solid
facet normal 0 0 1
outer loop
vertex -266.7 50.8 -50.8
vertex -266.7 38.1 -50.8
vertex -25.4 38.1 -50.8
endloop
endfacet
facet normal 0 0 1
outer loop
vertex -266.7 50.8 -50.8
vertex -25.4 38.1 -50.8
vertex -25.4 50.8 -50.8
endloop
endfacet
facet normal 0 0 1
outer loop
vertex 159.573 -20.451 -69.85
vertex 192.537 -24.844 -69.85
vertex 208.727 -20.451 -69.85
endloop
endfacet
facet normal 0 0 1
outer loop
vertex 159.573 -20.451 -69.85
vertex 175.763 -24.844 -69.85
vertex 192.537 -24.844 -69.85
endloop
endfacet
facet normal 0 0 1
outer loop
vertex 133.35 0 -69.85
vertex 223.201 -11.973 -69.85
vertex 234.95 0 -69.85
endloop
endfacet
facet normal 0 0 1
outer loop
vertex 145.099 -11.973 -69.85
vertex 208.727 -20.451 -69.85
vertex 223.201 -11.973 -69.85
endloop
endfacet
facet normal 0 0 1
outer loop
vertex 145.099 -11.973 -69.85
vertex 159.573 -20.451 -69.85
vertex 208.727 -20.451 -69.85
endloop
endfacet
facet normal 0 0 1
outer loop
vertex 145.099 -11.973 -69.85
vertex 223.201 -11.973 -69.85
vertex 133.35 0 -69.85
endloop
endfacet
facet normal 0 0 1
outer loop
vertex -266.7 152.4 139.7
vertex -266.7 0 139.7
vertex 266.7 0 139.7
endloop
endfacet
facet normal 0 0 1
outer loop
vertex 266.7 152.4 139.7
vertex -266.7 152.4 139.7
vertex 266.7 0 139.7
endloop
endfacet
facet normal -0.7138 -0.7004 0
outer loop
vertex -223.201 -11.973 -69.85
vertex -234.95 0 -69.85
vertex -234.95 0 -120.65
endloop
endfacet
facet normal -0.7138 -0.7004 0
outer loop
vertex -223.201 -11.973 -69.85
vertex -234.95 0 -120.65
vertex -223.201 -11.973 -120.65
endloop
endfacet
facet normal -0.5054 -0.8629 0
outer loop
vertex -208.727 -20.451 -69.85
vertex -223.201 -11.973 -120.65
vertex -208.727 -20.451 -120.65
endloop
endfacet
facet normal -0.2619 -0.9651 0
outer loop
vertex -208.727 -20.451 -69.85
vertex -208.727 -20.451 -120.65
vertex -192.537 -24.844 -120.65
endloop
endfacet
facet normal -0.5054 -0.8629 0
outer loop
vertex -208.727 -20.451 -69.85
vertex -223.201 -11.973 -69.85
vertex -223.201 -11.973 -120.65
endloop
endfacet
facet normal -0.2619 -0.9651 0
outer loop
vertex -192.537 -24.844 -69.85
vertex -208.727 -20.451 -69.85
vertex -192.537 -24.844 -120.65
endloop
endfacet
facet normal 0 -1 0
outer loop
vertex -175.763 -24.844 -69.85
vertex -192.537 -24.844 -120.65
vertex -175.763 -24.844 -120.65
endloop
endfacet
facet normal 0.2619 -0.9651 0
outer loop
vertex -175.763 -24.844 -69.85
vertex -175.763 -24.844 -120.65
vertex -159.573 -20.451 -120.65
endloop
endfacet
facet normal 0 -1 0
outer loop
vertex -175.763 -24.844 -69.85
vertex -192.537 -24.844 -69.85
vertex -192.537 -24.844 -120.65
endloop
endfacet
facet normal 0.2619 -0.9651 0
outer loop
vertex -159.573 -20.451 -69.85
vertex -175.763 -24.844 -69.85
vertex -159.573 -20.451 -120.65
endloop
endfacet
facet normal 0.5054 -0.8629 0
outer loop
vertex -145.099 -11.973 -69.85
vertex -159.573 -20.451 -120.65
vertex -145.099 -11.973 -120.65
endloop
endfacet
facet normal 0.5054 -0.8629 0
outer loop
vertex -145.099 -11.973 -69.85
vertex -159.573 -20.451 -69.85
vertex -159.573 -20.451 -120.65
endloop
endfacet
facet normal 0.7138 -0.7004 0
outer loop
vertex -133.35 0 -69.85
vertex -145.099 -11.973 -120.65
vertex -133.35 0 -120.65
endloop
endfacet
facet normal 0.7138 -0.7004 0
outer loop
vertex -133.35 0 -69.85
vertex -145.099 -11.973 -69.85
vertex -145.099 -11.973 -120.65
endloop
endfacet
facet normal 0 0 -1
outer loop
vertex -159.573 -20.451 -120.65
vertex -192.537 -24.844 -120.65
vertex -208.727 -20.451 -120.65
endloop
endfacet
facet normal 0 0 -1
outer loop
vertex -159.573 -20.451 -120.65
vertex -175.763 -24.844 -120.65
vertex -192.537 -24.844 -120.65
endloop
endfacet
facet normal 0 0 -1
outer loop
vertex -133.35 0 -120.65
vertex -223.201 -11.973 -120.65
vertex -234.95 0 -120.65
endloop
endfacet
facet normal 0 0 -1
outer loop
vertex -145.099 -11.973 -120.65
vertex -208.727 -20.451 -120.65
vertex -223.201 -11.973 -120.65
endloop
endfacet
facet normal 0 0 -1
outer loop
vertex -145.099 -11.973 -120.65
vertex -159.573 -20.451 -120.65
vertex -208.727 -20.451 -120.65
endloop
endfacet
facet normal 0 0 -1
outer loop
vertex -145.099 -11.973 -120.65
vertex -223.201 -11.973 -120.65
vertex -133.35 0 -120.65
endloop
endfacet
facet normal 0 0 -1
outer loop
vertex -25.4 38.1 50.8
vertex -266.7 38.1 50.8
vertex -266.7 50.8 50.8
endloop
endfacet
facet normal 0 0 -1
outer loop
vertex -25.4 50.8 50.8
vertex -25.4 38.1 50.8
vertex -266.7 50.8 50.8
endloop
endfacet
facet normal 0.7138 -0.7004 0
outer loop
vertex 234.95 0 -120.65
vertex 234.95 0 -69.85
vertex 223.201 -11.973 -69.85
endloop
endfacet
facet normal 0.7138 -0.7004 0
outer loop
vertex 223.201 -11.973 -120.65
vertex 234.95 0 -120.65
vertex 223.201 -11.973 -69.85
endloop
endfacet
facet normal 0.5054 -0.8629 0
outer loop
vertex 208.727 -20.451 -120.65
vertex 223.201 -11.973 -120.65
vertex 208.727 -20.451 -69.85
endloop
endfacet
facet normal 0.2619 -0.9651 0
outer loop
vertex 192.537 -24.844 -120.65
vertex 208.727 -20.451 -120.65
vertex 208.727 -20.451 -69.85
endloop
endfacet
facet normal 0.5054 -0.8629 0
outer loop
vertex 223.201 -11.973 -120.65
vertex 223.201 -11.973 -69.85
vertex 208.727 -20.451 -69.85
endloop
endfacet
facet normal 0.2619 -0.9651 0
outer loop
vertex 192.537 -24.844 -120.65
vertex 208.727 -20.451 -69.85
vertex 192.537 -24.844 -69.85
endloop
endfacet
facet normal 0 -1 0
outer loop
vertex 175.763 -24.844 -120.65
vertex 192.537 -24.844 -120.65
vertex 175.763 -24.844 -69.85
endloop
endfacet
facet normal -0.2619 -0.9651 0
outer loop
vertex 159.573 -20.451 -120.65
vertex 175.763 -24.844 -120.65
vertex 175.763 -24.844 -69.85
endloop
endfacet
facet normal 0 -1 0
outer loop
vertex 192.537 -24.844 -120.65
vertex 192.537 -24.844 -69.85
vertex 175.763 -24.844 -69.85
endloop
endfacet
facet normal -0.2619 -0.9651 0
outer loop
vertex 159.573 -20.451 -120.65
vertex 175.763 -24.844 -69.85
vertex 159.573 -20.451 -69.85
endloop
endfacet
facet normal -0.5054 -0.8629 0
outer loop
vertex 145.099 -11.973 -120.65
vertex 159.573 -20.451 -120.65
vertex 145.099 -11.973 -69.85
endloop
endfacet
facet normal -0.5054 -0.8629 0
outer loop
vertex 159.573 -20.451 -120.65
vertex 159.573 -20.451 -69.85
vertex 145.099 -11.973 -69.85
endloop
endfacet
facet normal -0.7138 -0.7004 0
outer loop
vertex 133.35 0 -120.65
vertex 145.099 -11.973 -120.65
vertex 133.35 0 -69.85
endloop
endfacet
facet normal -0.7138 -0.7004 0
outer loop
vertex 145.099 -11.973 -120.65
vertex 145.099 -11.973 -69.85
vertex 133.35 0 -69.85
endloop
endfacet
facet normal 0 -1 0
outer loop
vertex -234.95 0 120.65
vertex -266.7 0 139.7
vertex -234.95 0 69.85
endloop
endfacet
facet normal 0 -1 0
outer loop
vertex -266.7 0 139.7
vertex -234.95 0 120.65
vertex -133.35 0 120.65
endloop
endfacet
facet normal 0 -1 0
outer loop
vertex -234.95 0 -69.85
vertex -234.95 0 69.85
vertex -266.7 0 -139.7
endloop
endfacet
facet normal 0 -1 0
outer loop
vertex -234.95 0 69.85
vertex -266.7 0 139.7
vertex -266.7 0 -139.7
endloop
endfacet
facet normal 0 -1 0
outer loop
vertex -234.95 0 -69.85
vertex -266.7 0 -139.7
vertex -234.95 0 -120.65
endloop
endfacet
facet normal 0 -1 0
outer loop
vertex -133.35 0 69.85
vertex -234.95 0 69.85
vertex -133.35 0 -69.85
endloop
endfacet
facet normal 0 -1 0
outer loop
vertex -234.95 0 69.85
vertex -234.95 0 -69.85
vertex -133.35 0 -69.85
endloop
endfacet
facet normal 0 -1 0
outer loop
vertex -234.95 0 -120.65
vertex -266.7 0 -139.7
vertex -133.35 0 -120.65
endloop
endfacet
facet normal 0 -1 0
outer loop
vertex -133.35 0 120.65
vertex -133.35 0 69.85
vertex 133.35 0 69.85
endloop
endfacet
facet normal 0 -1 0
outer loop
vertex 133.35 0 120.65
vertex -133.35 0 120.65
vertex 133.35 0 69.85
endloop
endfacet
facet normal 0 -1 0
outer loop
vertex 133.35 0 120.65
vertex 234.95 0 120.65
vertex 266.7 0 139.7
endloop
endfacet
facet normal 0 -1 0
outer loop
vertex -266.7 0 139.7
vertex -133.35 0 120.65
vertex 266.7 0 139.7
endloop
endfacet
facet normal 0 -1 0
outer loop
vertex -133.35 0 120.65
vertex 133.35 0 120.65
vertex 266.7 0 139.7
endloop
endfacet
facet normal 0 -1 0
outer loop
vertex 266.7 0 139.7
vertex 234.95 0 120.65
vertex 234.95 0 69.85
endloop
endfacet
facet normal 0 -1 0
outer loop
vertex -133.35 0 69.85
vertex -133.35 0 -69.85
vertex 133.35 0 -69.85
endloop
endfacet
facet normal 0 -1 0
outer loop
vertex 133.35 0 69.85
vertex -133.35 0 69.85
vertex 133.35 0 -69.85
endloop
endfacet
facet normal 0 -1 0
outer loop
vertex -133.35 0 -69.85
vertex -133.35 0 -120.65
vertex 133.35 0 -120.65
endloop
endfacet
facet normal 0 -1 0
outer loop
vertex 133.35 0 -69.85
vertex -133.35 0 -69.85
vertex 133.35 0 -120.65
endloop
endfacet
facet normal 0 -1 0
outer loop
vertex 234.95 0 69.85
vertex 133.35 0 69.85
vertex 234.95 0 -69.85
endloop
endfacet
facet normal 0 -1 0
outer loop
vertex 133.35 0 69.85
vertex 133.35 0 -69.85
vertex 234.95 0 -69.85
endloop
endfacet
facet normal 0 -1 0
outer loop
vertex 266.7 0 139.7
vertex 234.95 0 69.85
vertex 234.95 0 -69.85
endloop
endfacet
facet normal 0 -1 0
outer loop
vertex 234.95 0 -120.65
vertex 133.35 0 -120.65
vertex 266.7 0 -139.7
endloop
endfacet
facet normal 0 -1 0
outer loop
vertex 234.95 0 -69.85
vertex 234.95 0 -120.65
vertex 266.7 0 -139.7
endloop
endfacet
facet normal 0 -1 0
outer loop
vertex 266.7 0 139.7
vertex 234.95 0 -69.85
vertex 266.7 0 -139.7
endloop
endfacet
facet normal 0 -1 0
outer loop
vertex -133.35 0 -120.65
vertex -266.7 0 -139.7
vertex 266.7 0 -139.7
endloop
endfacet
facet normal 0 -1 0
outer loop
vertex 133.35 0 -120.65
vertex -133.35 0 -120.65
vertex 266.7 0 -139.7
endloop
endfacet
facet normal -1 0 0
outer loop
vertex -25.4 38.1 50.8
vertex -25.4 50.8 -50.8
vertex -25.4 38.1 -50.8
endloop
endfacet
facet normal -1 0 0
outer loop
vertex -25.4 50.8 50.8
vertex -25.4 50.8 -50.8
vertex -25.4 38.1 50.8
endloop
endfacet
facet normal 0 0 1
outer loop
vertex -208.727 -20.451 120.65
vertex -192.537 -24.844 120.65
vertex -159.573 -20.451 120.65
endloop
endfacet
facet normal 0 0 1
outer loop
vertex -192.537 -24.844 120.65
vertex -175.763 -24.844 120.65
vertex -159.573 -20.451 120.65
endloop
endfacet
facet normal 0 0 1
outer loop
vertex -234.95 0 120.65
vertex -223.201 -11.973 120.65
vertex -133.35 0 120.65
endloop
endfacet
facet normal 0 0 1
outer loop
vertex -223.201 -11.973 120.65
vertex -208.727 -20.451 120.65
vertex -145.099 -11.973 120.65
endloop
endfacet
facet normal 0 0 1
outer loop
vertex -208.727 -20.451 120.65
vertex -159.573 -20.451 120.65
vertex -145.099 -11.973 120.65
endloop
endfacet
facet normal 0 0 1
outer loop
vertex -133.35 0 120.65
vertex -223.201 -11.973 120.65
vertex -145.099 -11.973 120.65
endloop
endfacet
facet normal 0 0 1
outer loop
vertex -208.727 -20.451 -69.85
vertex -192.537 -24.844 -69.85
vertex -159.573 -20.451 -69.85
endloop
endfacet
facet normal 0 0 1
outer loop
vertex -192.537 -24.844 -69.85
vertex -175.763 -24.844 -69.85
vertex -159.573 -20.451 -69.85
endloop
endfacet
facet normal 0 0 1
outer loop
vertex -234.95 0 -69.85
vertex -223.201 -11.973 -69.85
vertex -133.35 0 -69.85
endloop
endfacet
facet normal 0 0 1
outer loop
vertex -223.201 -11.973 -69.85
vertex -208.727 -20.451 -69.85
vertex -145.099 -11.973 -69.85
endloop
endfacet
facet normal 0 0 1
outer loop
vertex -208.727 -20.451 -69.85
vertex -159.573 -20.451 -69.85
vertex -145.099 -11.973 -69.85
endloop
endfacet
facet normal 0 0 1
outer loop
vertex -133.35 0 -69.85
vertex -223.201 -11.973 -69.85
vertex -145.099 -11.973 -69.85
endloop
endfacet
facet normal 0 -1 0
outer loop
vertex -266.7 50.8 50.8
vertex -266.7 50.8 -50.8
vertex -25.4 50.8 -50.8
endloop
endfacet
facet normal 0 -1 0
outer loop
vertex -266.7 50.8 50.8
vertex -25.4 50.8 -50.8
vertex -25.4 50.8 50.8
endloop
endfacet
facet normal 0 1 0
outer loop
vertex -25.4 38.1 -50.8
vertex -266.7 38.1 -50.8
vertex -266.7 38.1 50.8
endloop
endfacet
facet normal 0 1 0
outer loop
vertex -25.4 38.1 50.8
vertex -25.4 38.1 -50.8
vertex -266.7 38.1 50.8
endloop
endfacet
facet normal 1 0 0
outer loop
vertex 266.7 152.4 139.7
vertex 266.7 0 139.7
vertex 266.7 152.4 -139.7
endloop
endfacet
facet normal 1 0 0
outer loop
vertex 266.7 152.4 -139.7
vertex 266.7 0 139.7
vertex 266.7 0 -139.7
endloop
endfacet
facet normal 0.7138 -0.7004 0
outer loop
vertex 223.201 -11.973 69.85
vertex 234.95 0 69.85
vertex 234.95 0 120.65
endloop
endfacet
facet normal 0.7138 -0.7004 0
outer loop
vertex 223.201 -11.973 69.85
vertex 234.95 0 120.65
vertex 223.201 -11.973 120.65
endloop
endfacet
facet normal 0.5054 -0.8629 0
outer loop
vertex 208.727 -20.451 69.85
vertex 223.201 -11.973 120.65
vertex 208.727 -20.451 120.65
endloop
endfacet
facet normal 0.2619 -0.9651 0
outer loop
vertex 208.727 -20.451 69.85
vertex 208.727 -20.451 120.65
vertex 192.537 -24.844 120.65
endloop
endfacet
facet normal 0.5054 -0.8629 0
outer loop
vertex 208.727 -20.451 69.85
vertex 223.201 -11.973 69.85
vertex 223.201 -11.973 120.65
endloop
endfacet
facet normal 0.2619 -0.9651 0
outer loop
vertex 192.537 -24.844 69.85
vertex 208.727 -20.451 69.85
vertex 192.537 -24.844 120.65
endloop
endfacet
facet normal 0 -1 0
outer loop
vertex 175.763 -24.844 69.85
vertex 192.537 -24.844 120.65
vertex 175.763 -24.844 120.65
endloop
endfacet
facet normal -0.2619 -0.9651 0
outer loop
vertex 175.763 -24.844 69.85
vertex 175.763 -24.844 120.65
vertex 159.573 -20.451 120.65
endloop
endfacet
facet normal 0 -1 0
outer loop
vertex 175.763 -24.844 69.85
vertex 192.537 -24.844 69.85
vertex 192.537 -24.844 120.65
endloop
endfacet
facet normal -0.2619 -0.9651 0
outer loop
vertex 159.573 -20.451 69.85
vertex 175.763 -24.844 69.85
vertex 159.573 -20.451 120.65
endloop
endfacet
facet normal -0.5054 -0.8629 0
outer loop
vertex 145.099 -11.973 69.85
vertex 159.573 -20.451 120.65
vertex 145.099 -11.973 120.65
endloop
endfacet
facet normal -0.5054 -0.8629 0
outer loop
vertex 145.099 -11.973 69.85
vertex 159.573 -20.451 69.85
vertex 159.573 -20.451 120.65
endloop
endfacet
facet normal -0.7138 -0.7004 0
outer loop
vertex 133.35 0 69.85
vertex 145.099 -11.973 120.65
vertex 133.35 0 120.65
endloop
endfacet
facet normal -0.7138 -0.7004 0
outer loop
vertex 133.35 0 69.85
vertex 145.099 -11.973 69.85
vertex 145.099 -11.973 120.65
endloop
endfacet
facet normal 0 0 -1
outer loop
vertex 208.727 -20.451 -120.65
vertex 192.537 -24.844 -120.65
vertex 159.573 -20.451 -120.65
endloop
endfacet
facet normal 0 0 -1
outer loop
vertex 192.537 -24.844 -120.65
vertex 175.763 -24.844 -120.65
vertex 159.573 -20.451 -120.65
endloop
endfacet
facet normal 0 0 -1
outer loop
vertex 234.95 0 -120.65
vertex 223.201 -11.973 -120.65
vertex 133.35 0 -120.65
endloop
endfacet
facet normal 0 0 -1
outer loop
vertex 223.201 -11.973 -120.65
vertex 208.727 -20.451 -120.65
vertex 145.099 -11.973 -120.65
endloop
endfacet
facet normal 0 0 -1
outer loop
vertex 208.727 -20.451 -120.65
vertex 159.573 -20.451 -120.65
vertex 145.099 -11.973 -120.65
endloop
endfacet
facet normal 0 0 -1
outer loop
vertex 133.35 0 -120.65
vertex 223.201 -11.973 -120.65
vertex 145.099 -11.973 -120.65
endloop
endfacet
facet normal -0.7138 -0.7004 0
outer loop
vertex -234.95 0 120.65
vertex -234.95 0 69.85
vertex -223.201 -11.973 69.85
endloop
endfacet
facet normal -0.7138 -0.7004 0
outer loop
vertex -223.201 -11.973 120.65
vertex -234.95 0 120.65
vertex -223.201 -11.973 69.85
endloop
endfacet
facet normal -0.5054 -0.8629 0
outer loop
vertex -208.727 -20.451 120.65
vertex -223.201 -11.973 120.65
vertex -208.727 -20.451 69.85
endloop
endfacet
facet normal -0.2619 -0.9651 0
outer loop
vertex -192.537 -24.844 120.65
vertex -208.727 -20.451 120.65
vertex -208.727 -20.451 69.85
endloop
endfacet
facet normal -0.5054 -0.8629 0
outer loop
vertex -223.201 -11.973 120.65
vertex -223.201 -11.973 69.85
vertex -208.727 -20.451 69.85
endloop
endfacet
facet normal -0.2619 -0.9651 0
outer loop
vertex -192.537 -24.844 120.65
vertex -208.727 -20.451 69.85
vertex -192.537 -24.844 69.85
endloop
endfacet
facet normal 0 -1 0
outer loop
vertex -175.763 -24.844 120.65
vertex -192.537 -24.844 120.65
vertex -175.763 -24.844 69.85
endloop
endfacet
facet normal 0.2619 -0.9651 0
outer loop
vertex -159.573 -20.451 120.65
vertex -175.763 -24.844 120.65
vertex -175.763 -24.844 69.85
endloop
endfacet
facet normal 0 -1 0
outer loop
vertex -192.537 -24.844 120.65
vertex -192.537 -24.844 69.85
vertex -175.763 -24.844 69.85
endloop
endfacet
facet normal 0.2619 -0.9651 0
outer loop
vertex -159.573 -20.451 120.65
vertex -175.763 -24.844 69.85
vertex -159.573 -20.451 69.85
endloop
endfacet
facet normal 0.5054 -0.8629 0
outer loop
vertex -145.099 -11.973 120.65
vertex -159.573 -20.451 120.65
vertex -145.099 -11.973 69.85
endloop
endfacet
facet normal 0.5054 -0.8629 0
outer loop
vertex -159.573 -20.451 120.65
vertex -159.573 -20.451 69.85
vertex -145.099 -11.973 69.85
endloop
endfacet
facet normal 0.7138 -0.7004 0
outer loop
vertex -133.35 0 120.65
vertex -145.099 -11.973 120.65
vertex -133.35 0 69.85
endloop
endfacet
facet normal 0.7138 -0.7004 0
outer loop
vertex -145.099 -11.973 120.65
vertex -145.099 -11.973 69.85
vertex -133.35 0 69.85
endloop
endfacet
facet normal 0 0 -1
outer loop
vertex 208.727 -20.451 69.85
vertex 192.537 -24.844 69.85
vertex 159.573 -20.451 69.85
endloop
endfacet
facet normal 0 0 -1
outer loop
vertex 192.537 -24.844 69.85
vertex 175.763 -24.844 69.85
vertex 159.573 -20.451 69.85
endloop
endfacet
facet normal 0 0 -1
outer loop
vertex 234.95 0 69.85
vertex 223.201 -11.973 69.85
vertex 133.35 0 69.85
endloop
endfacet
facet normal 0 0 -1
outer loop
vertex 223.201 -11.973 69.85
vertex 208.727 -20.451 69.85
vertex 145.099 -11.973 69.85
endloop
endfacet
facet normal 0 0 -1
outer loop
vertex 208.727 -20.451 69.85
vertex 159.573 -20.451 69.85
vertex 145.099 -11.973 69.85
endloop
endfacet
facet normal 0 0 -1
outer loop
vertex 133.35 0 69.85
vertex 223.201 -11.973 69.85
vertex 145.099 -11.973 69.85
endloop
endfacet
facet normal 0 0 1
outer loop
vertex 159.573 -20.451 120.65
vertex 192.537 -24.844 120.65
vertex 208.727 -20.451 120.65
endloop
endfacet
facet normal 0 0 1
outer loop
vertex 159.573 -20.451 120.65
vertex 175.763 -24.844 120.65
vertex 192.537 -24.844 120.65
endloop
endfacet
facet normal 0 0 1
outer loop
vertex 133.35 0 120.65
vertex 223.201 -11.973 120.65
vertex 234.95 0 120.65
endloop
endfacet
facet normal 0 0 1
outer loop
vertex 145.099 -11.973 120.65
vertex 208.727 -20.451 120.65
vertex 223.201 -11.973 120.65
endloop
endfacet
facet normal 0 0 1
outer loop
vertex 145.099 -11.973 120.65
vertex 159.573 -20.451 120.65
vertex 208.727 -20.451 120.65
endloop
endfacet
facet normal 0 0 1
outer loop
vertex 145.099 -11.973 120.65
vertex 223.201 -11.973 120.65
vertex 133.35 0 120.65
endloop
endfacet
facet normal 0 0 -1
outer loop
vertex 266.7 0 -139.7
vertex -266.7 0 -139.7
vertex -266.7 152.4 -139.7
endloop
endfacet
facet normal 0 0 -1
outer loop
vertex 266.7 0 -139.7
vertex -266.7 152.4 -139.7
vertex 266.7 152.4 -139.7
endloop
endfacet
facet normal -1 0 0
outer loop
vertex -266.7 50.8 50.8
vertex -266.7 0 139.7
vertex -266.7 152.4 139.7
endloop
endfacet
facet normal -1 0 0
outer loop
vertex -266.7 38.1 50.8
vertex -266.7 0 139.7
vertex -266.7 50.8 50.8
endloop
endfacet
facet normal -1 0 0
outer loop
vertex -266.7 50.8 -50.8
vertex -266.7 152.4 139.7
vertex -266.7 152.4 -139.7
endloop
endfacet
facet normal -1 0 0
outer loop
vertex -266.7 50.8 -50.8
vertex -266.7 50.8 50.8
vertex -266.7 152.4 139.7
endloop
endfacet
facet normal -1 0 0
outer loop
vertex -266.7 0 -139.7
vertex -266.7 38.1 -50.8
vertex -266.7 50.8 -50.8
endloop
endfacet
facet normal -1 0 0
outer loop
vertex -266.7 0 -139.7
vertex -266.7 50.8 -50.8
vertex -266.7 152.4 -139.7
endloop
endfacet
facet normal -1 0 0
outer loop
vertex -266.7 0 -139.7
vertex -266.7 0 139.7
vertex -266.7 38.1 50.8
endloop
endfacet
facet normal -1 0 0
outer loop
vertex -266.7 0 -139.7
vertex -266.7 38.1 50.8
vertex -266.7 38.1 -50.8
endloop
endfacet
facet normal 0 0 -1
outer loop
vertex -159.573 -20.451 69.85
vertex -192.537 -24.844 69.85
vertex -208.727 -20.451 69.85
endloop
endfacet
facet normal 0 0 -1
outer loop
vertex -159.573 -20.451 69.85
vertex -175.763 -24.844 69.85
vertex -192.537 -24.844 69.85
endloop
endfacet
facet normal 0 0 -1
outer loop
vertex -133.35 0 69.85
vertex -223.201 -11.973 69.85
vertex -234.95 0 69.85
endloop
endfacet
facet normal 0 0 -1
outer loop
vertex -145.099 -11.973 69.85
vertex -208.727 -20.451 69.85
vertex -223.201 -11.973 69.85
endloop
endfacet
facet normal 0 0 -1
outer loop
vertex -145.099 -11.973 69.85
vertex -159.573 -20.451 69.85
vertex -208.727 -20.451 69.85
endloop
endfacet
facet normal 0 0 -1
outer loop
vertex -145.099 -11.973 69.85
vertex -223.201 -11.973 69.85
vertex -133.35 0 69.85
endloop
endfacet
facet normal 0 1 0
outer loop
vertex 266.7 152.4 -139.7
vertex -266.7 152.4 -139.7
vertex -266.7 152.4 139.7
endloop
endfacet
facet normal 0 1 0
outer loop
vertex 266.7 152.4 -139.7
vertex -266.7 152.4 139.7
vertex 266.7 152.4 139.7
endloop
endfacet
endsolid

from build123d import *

# Parameters (mm, degrees)
CHASIS_W                = 533.4
CHASIS_H                = 279.4
BOSS_EXTRUDE1_DEPTH     = 152.4
SKETCH3_W               = 63.5
SKETCH3_H               = 50.8
MIRROR2_COPY_1_SKETCH_W = 63.5
MIRROR2_COPY_1_SKETCH_H = 50.8
SKETCH4_W               = 101.6
SKETCH4_H               = 12.7
CUT_EXTRUDE1_DEPTH      = 241.3


with BuildPart() as part:
    # Chasis → Boss-Extrude1 (new body)
    with BuildSketch(Plane(origin=(0, 0, 0), x_dir=(1, 0, 0), z_dir=(0, 1, 0))):
        Rectangle(CHASIS_W, CHASIS_H)
    extrude(amount=BOSS_EXTRUDE1_DEPTH)

    # Sketch3 → Revolve2 (revolve)
    with BuildSketch(Plane(origin=(0, 38.1, 0), x_dir=(-1, 0, 0), z_dir=(0, -1, 0))):
        with Locations((215.9, -95.25)):
            Rectangle(SKETCH3_W, SKETCH3_H)
    revolve2 = revolve(axis=Axis((-184.15, 38.1, 69.85), (0, 0, 1)))

    # Mirror1: Revolve2 across plane
    add(revolve2.mirror(Plane.XY))

    # Mirror2: Revolve2 across plane
    add(revolve2.mirror(Plane(origin=(0, 0, 0), x_dir=(0, 0, 1), z_dir=(1, 0, 0))))

    # Mirror2 copy 1 sketch → Mirror2 copy 1 (revolve)
    with BuildSketch(Plane.XZ.offset(-38.1)):
        with Locations((215.9, -95.25)):
            Rectangle(MIRROR2_COPY_1_SKETCH_W, MIRROR2_COPY_1_SKETCH_H)
    revolve(axis=Axis((184.15, 38.1, -69.85), (0, 0, -1)))

    # Sketch4 → Cut-Extrude1 (cut)
    with BuildSketch(Plane.ZY.offset(266.7)):
        with Locations((0, 44.45)):
            Rectangle(SKETCH4_W, SKETCH4_H)
    extrude(amount=-CUT_EXTRUDE1_DEPTH, mode=Mode.SUBTRACT)


solid = part.part
